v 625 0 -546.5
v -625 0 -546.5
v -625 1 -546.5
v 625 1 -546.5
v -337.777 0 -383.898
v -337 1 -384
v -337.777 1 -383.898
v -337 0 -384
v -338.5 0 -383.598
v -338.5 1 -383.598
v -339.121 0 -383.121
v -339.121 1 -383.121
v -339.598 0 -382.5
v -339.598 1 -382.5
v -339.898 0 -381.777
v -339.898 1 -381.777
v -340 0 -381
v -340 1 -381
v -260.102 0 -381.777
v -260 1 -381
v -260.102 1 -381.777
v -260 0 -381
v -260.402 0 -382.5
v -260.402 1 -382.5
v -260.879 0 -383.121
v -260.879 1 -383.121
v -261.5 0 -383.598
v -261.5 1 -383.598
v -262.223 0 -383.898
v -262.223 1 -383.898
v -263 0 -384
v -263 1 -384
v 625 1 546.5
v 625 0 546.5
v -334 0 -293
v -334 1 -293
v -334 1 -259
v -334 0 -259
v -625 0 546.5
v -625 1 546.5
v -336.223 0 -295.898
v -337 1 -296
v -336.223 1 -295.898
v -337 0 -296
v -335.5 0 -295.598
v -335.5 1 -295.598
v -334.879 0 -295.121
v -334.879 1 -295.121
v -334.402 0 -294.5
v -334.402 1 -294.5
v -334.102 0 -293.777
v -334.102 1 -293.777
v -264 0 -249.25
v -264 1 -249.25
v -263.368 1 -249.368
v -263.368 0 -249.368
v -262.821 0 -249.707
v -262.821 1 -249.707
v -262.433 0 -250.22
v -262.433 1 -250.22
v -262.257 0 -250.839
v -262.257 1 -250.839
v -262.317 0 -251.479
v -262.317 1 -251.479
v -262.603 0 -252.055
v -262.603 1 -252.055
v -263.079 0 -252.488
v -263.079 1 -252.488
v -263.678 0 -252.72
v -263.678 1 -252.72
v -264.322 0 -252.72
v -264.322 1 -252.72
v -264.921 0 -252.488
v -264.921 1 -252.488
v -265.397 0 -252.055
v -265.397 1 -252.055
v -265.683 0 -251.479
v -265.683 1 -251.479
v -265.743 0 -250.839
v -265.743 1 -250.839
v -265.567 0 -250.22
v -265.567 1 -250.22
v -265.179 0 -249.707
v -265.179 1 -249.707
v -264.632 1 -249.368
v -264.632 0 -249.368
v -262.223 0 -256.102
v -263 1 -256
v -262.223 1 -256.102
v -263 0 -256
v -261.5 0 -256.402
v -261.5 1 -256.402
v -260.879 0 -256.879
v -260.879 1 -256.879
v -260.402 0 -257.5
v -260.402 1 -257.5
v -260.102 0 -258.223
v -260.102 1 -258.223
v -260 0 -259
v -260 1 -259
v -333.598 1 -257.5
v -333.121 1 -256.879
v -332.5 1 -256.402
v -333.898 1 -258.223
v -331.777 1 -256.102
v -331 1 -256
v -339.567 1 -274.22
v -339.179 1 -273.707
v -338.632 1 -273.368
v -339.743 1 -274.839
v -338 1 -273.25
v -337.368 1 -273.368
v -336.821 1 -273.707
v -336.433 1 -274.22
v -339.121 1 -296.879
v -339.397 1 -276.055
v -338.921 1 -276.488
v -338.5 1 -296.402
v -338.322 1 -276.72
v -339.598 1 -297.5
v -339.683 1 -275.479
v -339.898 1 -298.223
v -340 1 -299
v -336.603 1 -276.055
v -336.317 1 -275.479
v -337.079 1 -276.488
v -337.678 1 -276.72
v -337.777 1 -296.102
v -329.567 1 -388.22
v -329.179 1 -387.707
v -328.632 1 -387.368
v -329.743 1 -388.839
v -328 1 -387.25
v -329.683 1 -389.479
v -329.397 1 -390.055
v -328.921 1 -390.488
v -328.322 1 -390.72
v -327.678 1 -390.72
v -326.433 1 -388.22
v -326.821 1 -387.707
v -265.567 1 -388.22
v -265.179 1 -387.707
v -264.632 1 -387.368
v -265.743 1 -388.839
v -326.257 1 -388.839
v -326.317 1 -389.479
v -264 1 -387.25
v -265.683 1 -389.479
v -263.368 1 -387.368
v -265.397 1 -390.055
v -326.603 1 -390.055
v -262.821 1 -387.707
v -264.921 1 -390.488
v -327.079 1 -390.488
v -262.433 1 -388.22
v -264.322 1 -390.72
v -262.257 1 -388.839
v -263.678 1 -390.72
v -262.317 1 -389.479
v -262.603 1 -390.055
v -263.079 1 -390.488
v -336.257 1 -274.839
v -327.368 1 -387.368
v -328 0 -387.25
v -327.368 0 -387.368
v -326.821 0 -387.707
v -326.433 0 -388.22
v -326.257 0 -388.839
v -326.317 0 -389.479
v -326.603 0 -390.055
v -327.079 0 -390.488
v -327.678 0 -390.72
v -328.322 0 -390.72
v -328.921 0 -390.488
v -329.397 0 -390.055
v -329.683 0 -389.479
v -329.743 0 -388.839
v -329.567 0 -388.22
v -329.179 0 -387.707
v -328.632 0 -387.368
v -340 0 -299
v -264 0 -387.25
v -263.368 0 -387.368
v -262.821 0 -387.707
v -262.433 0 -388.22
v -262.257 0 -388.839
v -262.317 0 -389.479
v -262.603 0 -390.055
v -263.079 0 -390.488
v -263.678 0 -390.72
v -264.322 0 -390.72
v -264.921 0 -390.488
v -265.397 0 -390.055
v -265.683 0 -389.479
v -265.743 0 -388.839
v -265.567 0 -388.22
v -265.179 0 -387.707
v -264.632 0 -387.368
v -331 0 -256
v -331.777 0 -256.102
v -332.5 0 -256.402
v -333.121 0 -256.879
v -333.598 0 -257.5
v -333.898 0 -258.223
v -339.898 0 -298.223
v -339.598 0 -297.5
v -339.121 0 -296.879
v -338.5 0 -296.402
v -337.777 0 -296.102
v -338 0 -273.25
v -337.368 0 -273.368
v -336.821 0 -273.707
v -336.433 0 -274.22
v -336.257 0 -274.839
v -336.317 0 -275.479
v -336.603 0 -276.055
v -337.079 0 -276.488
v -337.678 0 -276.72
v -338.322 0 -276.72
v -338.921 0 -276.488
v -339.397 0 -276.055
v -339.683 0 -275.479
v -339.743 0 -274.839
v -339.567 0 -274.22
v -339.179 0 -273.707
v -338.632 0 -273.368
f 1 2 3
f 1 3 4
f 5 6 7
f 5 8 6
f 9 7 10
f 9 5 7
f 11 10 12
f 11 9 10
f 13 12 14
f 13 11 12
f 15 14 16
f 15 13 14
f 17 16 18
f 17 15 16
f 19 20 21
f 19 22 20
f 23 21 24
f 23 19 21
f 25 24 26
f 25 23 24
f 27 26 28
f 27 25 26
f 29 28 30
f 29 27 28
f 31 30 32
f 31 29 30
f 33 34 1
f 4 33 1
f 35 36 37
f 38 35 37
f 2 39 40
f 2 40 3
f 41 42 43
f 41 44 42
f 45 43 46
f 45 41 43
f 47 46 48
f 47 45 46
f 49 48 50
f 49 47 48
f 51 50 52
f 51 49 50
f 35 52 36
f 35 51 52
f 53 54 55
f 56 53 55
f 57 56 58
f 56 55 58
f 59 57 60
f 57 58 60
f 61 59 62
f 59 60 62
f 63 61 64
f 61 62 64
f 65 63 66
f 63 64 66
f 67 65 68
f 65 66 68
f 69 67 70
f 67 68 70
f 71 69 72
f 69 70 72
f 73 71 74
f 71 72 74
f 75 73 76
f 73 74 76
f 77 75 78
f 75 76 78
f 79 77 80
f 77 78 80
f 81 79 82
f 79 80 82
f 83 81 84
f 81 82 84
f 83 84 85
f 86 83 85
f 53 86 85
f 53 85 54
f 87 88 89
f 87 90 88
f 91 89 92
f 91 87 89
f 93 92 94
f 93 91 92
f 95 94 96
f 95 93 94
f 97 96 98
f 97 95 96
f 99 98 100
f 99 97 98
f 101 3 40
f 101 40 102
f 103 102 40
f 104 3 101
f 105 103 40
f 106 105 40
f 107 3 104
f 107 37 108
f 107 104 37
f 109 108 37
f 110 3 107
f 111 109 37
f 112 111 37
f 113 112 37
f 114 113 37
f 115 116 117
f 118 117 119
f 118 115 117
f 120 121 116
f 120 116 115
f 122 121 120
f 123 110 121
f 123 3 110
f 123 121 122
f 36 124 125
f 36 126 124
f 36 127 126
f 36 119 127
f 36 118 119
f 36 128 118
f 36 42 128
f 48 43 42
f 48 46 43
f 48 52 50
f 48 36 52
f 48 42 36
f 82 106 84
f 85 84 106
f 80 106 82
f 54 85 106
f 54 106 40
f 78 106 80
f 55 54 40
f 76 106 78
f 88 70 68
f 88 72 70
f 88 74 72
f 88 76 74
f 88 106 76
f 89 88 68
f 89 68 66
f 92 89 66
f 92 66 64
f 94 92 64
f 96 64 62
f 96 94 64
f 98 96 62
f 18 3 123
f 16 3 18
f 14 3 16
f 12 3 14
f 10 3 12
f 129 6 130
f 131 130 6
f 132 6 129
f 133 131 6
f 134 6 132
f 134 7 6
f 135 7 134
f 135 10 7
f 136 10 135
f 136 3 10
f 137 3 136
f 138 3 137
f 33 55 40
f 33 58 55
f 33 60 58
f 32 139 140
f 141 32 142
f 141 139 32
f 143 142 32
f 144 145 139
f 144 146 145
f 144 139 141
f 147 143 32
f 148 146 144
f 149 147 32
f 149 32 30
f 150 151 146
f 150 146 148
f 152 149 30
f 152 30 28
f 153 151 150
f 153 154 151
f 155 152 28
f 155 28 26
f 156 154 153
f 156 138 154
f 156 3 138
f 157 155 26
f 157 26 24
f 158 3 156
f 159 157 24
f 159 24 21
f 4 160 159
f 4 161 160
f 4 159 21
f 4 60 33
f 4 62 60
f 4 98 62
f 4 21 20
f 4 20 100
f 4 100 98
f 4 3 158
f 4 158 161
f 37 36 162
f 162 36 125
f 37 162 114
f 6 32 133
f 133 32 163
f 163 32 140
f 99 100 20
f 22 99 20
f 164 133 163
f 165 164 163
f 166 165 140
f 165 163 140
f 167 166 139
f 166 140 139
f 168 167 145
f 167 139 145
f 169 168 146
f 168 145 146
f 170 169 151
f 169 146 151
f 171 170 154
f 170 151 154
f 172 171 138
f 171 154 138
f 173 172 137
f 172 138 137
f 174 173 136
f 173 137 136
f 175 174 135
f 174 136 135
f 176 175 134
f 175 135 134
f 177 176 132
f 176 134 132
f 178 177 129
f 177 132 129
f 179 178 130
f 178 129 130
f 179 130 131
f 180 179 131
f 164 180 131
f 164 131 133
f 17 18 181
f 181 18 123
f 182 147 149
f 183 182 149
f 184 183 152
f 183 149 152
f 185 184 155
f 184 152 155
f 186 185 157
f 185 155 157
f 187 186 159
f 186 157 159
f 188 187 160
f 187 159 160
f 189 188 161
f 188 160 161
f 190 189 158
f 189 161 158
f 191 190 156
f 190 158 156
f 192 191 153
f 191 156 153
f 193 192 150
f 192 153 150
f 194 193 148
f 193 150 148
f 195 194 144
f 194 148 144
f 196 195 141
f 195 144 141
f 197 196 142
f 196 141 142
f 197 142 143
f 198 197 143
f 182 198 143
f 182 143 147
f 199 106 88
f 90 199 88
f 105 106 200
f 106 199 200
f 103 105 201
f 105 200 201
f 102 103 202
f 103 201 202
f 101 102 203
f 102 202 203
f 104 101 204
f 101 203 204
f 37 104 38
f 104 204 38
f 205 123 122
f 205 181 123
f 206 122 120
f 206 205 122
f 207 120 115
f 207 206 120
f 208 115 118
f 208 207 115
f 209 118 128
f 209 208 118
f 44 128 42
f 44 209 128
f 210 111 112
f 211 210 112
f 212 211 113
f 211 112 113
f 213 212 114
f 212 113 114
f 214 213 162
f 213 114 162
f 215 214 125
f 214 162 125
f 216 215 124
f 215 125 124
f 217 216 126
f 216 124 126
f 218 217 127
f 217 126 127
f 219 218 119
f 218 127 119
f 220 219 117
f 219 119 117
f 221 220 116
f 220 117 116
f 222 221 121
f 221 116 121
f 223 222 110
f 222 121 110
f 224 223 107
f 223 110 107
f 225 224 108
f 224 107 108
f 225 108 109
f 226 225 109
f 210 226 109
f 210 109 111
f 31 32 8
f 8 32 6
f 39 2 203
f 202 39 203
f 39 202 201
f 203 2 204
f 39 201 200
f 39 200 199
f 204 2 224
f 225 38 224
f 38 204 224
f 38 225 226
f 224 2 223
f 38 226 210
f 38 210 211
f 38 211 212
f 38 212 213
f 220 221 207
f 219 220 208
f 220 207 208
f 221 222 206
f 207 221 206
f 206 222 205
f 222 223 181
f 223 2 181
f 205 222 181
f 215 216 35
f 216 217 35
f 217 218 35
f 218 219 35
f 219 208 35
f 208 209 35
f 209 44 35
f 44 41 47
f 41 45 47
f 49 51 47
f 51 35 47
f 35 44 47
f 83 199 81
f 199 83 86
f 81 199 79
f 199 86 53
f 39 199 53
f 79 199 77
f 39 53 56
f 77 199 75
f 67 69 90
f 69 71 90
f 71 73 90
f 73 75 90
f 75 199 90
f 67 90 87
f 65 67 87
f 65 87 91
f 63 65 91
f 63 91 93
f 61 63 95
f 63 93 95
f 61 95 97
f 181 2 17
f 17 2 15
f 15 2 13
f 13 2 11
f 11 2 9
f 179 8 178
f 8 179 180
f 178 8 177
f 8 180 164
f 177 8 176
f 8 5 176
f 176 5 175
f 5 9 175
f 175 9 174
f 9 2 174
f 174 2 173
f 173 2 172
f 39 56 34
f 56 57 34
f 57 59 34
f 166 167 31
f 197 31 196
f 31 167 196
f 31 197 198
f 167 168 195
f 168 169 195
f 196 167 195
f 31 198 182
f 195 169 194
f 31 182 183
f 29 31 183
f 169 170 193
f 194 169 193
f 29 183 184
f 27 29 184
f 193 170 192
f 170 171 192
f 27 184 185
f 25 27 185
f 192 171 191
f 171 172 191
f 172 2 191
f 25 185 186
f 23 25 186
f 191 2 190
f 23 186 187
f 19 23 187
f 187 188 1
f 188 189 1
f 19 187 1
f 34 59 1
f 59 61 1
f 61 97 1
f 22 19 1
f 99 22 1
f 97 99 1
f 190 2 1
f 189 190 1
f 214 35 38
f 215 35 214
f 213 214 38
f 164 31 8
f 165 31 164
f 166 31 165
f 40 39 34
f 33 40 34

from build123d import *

# Parameters (mm, degrees)
SKETCH1_W           = 1250
SKETCH1_H           = 1093
BOSS_EXTRUDE1_DEPTH = 1
CUT_EXTRUDE1_DEPTH  = 10
FILLET2_R           = 3
SKETCH3_R           = 1.75
CUT_EXTRUDE2_DEPTH  = 10


with BuildPart() as part:
    # Sketch1 → Boss-Extrude1 (new body)
    with BuildSketch(Plane(origin=(0, 0, 0), x_dir=(1, 0, 0), z_dir=(0, 1, 0))):
        Rectangle(SKETCH1_W, SKETCH1_H)
    extrude(amount=BOSS_EXTRUDE1_DEPTH)

    # Sketch2 → Cut-Extrude1 (cut)
    with BuildSketch(Plane(origin=(0, 1, 0), x_dir=(1, 0, 0), z_dir=(0, 1, 0))):
        Polygon((-334, 256), (-260, 256), (-260, 384), (-340, 384), (-340, 296), (-334, 296), align=None)
    extrude(amount=-CUT_EXTRUDE1_DEPTH, mode=Mode.SUBTRACT)

    # Fillet2
    fillet2_edges = [part.edges().sort_by_distance(p)[0] for p in [
        (-260, 0.5, -256),
        (-334, 0.5, -256),
        (-334, 0.5, -296),
        (-340, 0.5, -296),
        (-340, 0.5, -384),
        (-260, 0.5, -384),
    ]]
    fillet(fillet2_edges, radius=FILLET2_R - 0.0001)  # a hair under: the kernel refuses the full size

    # Sketch3 → Cut-Extrude2 (cut)
    with BuildSketch(Plane(origin=(0, 1, 0), x_dir=(1, 0, 0), z_dir=(0, 1, 0))):
        with Locations(Location((-264, 389, 0), (0, 0, 270))):
            Circle(SKETCH3_R)
        with Locations(Location((-328, 389, 0), (0, 0, 270))):
            Circle(SKETCH3_R)
        with Locations(Location((-338, 275, 0), (0, 0, 270))):
            Circle(SKETCH3_R)
        with Locations(Location((-264, 251, 0), (0, 0, 270))):
            Circle(SKETCH3_R)
    extrude(amount=-CUT_EXTRUDE2_DEPTH, mode=Mode.SUBTRACT)


solid = part.part
